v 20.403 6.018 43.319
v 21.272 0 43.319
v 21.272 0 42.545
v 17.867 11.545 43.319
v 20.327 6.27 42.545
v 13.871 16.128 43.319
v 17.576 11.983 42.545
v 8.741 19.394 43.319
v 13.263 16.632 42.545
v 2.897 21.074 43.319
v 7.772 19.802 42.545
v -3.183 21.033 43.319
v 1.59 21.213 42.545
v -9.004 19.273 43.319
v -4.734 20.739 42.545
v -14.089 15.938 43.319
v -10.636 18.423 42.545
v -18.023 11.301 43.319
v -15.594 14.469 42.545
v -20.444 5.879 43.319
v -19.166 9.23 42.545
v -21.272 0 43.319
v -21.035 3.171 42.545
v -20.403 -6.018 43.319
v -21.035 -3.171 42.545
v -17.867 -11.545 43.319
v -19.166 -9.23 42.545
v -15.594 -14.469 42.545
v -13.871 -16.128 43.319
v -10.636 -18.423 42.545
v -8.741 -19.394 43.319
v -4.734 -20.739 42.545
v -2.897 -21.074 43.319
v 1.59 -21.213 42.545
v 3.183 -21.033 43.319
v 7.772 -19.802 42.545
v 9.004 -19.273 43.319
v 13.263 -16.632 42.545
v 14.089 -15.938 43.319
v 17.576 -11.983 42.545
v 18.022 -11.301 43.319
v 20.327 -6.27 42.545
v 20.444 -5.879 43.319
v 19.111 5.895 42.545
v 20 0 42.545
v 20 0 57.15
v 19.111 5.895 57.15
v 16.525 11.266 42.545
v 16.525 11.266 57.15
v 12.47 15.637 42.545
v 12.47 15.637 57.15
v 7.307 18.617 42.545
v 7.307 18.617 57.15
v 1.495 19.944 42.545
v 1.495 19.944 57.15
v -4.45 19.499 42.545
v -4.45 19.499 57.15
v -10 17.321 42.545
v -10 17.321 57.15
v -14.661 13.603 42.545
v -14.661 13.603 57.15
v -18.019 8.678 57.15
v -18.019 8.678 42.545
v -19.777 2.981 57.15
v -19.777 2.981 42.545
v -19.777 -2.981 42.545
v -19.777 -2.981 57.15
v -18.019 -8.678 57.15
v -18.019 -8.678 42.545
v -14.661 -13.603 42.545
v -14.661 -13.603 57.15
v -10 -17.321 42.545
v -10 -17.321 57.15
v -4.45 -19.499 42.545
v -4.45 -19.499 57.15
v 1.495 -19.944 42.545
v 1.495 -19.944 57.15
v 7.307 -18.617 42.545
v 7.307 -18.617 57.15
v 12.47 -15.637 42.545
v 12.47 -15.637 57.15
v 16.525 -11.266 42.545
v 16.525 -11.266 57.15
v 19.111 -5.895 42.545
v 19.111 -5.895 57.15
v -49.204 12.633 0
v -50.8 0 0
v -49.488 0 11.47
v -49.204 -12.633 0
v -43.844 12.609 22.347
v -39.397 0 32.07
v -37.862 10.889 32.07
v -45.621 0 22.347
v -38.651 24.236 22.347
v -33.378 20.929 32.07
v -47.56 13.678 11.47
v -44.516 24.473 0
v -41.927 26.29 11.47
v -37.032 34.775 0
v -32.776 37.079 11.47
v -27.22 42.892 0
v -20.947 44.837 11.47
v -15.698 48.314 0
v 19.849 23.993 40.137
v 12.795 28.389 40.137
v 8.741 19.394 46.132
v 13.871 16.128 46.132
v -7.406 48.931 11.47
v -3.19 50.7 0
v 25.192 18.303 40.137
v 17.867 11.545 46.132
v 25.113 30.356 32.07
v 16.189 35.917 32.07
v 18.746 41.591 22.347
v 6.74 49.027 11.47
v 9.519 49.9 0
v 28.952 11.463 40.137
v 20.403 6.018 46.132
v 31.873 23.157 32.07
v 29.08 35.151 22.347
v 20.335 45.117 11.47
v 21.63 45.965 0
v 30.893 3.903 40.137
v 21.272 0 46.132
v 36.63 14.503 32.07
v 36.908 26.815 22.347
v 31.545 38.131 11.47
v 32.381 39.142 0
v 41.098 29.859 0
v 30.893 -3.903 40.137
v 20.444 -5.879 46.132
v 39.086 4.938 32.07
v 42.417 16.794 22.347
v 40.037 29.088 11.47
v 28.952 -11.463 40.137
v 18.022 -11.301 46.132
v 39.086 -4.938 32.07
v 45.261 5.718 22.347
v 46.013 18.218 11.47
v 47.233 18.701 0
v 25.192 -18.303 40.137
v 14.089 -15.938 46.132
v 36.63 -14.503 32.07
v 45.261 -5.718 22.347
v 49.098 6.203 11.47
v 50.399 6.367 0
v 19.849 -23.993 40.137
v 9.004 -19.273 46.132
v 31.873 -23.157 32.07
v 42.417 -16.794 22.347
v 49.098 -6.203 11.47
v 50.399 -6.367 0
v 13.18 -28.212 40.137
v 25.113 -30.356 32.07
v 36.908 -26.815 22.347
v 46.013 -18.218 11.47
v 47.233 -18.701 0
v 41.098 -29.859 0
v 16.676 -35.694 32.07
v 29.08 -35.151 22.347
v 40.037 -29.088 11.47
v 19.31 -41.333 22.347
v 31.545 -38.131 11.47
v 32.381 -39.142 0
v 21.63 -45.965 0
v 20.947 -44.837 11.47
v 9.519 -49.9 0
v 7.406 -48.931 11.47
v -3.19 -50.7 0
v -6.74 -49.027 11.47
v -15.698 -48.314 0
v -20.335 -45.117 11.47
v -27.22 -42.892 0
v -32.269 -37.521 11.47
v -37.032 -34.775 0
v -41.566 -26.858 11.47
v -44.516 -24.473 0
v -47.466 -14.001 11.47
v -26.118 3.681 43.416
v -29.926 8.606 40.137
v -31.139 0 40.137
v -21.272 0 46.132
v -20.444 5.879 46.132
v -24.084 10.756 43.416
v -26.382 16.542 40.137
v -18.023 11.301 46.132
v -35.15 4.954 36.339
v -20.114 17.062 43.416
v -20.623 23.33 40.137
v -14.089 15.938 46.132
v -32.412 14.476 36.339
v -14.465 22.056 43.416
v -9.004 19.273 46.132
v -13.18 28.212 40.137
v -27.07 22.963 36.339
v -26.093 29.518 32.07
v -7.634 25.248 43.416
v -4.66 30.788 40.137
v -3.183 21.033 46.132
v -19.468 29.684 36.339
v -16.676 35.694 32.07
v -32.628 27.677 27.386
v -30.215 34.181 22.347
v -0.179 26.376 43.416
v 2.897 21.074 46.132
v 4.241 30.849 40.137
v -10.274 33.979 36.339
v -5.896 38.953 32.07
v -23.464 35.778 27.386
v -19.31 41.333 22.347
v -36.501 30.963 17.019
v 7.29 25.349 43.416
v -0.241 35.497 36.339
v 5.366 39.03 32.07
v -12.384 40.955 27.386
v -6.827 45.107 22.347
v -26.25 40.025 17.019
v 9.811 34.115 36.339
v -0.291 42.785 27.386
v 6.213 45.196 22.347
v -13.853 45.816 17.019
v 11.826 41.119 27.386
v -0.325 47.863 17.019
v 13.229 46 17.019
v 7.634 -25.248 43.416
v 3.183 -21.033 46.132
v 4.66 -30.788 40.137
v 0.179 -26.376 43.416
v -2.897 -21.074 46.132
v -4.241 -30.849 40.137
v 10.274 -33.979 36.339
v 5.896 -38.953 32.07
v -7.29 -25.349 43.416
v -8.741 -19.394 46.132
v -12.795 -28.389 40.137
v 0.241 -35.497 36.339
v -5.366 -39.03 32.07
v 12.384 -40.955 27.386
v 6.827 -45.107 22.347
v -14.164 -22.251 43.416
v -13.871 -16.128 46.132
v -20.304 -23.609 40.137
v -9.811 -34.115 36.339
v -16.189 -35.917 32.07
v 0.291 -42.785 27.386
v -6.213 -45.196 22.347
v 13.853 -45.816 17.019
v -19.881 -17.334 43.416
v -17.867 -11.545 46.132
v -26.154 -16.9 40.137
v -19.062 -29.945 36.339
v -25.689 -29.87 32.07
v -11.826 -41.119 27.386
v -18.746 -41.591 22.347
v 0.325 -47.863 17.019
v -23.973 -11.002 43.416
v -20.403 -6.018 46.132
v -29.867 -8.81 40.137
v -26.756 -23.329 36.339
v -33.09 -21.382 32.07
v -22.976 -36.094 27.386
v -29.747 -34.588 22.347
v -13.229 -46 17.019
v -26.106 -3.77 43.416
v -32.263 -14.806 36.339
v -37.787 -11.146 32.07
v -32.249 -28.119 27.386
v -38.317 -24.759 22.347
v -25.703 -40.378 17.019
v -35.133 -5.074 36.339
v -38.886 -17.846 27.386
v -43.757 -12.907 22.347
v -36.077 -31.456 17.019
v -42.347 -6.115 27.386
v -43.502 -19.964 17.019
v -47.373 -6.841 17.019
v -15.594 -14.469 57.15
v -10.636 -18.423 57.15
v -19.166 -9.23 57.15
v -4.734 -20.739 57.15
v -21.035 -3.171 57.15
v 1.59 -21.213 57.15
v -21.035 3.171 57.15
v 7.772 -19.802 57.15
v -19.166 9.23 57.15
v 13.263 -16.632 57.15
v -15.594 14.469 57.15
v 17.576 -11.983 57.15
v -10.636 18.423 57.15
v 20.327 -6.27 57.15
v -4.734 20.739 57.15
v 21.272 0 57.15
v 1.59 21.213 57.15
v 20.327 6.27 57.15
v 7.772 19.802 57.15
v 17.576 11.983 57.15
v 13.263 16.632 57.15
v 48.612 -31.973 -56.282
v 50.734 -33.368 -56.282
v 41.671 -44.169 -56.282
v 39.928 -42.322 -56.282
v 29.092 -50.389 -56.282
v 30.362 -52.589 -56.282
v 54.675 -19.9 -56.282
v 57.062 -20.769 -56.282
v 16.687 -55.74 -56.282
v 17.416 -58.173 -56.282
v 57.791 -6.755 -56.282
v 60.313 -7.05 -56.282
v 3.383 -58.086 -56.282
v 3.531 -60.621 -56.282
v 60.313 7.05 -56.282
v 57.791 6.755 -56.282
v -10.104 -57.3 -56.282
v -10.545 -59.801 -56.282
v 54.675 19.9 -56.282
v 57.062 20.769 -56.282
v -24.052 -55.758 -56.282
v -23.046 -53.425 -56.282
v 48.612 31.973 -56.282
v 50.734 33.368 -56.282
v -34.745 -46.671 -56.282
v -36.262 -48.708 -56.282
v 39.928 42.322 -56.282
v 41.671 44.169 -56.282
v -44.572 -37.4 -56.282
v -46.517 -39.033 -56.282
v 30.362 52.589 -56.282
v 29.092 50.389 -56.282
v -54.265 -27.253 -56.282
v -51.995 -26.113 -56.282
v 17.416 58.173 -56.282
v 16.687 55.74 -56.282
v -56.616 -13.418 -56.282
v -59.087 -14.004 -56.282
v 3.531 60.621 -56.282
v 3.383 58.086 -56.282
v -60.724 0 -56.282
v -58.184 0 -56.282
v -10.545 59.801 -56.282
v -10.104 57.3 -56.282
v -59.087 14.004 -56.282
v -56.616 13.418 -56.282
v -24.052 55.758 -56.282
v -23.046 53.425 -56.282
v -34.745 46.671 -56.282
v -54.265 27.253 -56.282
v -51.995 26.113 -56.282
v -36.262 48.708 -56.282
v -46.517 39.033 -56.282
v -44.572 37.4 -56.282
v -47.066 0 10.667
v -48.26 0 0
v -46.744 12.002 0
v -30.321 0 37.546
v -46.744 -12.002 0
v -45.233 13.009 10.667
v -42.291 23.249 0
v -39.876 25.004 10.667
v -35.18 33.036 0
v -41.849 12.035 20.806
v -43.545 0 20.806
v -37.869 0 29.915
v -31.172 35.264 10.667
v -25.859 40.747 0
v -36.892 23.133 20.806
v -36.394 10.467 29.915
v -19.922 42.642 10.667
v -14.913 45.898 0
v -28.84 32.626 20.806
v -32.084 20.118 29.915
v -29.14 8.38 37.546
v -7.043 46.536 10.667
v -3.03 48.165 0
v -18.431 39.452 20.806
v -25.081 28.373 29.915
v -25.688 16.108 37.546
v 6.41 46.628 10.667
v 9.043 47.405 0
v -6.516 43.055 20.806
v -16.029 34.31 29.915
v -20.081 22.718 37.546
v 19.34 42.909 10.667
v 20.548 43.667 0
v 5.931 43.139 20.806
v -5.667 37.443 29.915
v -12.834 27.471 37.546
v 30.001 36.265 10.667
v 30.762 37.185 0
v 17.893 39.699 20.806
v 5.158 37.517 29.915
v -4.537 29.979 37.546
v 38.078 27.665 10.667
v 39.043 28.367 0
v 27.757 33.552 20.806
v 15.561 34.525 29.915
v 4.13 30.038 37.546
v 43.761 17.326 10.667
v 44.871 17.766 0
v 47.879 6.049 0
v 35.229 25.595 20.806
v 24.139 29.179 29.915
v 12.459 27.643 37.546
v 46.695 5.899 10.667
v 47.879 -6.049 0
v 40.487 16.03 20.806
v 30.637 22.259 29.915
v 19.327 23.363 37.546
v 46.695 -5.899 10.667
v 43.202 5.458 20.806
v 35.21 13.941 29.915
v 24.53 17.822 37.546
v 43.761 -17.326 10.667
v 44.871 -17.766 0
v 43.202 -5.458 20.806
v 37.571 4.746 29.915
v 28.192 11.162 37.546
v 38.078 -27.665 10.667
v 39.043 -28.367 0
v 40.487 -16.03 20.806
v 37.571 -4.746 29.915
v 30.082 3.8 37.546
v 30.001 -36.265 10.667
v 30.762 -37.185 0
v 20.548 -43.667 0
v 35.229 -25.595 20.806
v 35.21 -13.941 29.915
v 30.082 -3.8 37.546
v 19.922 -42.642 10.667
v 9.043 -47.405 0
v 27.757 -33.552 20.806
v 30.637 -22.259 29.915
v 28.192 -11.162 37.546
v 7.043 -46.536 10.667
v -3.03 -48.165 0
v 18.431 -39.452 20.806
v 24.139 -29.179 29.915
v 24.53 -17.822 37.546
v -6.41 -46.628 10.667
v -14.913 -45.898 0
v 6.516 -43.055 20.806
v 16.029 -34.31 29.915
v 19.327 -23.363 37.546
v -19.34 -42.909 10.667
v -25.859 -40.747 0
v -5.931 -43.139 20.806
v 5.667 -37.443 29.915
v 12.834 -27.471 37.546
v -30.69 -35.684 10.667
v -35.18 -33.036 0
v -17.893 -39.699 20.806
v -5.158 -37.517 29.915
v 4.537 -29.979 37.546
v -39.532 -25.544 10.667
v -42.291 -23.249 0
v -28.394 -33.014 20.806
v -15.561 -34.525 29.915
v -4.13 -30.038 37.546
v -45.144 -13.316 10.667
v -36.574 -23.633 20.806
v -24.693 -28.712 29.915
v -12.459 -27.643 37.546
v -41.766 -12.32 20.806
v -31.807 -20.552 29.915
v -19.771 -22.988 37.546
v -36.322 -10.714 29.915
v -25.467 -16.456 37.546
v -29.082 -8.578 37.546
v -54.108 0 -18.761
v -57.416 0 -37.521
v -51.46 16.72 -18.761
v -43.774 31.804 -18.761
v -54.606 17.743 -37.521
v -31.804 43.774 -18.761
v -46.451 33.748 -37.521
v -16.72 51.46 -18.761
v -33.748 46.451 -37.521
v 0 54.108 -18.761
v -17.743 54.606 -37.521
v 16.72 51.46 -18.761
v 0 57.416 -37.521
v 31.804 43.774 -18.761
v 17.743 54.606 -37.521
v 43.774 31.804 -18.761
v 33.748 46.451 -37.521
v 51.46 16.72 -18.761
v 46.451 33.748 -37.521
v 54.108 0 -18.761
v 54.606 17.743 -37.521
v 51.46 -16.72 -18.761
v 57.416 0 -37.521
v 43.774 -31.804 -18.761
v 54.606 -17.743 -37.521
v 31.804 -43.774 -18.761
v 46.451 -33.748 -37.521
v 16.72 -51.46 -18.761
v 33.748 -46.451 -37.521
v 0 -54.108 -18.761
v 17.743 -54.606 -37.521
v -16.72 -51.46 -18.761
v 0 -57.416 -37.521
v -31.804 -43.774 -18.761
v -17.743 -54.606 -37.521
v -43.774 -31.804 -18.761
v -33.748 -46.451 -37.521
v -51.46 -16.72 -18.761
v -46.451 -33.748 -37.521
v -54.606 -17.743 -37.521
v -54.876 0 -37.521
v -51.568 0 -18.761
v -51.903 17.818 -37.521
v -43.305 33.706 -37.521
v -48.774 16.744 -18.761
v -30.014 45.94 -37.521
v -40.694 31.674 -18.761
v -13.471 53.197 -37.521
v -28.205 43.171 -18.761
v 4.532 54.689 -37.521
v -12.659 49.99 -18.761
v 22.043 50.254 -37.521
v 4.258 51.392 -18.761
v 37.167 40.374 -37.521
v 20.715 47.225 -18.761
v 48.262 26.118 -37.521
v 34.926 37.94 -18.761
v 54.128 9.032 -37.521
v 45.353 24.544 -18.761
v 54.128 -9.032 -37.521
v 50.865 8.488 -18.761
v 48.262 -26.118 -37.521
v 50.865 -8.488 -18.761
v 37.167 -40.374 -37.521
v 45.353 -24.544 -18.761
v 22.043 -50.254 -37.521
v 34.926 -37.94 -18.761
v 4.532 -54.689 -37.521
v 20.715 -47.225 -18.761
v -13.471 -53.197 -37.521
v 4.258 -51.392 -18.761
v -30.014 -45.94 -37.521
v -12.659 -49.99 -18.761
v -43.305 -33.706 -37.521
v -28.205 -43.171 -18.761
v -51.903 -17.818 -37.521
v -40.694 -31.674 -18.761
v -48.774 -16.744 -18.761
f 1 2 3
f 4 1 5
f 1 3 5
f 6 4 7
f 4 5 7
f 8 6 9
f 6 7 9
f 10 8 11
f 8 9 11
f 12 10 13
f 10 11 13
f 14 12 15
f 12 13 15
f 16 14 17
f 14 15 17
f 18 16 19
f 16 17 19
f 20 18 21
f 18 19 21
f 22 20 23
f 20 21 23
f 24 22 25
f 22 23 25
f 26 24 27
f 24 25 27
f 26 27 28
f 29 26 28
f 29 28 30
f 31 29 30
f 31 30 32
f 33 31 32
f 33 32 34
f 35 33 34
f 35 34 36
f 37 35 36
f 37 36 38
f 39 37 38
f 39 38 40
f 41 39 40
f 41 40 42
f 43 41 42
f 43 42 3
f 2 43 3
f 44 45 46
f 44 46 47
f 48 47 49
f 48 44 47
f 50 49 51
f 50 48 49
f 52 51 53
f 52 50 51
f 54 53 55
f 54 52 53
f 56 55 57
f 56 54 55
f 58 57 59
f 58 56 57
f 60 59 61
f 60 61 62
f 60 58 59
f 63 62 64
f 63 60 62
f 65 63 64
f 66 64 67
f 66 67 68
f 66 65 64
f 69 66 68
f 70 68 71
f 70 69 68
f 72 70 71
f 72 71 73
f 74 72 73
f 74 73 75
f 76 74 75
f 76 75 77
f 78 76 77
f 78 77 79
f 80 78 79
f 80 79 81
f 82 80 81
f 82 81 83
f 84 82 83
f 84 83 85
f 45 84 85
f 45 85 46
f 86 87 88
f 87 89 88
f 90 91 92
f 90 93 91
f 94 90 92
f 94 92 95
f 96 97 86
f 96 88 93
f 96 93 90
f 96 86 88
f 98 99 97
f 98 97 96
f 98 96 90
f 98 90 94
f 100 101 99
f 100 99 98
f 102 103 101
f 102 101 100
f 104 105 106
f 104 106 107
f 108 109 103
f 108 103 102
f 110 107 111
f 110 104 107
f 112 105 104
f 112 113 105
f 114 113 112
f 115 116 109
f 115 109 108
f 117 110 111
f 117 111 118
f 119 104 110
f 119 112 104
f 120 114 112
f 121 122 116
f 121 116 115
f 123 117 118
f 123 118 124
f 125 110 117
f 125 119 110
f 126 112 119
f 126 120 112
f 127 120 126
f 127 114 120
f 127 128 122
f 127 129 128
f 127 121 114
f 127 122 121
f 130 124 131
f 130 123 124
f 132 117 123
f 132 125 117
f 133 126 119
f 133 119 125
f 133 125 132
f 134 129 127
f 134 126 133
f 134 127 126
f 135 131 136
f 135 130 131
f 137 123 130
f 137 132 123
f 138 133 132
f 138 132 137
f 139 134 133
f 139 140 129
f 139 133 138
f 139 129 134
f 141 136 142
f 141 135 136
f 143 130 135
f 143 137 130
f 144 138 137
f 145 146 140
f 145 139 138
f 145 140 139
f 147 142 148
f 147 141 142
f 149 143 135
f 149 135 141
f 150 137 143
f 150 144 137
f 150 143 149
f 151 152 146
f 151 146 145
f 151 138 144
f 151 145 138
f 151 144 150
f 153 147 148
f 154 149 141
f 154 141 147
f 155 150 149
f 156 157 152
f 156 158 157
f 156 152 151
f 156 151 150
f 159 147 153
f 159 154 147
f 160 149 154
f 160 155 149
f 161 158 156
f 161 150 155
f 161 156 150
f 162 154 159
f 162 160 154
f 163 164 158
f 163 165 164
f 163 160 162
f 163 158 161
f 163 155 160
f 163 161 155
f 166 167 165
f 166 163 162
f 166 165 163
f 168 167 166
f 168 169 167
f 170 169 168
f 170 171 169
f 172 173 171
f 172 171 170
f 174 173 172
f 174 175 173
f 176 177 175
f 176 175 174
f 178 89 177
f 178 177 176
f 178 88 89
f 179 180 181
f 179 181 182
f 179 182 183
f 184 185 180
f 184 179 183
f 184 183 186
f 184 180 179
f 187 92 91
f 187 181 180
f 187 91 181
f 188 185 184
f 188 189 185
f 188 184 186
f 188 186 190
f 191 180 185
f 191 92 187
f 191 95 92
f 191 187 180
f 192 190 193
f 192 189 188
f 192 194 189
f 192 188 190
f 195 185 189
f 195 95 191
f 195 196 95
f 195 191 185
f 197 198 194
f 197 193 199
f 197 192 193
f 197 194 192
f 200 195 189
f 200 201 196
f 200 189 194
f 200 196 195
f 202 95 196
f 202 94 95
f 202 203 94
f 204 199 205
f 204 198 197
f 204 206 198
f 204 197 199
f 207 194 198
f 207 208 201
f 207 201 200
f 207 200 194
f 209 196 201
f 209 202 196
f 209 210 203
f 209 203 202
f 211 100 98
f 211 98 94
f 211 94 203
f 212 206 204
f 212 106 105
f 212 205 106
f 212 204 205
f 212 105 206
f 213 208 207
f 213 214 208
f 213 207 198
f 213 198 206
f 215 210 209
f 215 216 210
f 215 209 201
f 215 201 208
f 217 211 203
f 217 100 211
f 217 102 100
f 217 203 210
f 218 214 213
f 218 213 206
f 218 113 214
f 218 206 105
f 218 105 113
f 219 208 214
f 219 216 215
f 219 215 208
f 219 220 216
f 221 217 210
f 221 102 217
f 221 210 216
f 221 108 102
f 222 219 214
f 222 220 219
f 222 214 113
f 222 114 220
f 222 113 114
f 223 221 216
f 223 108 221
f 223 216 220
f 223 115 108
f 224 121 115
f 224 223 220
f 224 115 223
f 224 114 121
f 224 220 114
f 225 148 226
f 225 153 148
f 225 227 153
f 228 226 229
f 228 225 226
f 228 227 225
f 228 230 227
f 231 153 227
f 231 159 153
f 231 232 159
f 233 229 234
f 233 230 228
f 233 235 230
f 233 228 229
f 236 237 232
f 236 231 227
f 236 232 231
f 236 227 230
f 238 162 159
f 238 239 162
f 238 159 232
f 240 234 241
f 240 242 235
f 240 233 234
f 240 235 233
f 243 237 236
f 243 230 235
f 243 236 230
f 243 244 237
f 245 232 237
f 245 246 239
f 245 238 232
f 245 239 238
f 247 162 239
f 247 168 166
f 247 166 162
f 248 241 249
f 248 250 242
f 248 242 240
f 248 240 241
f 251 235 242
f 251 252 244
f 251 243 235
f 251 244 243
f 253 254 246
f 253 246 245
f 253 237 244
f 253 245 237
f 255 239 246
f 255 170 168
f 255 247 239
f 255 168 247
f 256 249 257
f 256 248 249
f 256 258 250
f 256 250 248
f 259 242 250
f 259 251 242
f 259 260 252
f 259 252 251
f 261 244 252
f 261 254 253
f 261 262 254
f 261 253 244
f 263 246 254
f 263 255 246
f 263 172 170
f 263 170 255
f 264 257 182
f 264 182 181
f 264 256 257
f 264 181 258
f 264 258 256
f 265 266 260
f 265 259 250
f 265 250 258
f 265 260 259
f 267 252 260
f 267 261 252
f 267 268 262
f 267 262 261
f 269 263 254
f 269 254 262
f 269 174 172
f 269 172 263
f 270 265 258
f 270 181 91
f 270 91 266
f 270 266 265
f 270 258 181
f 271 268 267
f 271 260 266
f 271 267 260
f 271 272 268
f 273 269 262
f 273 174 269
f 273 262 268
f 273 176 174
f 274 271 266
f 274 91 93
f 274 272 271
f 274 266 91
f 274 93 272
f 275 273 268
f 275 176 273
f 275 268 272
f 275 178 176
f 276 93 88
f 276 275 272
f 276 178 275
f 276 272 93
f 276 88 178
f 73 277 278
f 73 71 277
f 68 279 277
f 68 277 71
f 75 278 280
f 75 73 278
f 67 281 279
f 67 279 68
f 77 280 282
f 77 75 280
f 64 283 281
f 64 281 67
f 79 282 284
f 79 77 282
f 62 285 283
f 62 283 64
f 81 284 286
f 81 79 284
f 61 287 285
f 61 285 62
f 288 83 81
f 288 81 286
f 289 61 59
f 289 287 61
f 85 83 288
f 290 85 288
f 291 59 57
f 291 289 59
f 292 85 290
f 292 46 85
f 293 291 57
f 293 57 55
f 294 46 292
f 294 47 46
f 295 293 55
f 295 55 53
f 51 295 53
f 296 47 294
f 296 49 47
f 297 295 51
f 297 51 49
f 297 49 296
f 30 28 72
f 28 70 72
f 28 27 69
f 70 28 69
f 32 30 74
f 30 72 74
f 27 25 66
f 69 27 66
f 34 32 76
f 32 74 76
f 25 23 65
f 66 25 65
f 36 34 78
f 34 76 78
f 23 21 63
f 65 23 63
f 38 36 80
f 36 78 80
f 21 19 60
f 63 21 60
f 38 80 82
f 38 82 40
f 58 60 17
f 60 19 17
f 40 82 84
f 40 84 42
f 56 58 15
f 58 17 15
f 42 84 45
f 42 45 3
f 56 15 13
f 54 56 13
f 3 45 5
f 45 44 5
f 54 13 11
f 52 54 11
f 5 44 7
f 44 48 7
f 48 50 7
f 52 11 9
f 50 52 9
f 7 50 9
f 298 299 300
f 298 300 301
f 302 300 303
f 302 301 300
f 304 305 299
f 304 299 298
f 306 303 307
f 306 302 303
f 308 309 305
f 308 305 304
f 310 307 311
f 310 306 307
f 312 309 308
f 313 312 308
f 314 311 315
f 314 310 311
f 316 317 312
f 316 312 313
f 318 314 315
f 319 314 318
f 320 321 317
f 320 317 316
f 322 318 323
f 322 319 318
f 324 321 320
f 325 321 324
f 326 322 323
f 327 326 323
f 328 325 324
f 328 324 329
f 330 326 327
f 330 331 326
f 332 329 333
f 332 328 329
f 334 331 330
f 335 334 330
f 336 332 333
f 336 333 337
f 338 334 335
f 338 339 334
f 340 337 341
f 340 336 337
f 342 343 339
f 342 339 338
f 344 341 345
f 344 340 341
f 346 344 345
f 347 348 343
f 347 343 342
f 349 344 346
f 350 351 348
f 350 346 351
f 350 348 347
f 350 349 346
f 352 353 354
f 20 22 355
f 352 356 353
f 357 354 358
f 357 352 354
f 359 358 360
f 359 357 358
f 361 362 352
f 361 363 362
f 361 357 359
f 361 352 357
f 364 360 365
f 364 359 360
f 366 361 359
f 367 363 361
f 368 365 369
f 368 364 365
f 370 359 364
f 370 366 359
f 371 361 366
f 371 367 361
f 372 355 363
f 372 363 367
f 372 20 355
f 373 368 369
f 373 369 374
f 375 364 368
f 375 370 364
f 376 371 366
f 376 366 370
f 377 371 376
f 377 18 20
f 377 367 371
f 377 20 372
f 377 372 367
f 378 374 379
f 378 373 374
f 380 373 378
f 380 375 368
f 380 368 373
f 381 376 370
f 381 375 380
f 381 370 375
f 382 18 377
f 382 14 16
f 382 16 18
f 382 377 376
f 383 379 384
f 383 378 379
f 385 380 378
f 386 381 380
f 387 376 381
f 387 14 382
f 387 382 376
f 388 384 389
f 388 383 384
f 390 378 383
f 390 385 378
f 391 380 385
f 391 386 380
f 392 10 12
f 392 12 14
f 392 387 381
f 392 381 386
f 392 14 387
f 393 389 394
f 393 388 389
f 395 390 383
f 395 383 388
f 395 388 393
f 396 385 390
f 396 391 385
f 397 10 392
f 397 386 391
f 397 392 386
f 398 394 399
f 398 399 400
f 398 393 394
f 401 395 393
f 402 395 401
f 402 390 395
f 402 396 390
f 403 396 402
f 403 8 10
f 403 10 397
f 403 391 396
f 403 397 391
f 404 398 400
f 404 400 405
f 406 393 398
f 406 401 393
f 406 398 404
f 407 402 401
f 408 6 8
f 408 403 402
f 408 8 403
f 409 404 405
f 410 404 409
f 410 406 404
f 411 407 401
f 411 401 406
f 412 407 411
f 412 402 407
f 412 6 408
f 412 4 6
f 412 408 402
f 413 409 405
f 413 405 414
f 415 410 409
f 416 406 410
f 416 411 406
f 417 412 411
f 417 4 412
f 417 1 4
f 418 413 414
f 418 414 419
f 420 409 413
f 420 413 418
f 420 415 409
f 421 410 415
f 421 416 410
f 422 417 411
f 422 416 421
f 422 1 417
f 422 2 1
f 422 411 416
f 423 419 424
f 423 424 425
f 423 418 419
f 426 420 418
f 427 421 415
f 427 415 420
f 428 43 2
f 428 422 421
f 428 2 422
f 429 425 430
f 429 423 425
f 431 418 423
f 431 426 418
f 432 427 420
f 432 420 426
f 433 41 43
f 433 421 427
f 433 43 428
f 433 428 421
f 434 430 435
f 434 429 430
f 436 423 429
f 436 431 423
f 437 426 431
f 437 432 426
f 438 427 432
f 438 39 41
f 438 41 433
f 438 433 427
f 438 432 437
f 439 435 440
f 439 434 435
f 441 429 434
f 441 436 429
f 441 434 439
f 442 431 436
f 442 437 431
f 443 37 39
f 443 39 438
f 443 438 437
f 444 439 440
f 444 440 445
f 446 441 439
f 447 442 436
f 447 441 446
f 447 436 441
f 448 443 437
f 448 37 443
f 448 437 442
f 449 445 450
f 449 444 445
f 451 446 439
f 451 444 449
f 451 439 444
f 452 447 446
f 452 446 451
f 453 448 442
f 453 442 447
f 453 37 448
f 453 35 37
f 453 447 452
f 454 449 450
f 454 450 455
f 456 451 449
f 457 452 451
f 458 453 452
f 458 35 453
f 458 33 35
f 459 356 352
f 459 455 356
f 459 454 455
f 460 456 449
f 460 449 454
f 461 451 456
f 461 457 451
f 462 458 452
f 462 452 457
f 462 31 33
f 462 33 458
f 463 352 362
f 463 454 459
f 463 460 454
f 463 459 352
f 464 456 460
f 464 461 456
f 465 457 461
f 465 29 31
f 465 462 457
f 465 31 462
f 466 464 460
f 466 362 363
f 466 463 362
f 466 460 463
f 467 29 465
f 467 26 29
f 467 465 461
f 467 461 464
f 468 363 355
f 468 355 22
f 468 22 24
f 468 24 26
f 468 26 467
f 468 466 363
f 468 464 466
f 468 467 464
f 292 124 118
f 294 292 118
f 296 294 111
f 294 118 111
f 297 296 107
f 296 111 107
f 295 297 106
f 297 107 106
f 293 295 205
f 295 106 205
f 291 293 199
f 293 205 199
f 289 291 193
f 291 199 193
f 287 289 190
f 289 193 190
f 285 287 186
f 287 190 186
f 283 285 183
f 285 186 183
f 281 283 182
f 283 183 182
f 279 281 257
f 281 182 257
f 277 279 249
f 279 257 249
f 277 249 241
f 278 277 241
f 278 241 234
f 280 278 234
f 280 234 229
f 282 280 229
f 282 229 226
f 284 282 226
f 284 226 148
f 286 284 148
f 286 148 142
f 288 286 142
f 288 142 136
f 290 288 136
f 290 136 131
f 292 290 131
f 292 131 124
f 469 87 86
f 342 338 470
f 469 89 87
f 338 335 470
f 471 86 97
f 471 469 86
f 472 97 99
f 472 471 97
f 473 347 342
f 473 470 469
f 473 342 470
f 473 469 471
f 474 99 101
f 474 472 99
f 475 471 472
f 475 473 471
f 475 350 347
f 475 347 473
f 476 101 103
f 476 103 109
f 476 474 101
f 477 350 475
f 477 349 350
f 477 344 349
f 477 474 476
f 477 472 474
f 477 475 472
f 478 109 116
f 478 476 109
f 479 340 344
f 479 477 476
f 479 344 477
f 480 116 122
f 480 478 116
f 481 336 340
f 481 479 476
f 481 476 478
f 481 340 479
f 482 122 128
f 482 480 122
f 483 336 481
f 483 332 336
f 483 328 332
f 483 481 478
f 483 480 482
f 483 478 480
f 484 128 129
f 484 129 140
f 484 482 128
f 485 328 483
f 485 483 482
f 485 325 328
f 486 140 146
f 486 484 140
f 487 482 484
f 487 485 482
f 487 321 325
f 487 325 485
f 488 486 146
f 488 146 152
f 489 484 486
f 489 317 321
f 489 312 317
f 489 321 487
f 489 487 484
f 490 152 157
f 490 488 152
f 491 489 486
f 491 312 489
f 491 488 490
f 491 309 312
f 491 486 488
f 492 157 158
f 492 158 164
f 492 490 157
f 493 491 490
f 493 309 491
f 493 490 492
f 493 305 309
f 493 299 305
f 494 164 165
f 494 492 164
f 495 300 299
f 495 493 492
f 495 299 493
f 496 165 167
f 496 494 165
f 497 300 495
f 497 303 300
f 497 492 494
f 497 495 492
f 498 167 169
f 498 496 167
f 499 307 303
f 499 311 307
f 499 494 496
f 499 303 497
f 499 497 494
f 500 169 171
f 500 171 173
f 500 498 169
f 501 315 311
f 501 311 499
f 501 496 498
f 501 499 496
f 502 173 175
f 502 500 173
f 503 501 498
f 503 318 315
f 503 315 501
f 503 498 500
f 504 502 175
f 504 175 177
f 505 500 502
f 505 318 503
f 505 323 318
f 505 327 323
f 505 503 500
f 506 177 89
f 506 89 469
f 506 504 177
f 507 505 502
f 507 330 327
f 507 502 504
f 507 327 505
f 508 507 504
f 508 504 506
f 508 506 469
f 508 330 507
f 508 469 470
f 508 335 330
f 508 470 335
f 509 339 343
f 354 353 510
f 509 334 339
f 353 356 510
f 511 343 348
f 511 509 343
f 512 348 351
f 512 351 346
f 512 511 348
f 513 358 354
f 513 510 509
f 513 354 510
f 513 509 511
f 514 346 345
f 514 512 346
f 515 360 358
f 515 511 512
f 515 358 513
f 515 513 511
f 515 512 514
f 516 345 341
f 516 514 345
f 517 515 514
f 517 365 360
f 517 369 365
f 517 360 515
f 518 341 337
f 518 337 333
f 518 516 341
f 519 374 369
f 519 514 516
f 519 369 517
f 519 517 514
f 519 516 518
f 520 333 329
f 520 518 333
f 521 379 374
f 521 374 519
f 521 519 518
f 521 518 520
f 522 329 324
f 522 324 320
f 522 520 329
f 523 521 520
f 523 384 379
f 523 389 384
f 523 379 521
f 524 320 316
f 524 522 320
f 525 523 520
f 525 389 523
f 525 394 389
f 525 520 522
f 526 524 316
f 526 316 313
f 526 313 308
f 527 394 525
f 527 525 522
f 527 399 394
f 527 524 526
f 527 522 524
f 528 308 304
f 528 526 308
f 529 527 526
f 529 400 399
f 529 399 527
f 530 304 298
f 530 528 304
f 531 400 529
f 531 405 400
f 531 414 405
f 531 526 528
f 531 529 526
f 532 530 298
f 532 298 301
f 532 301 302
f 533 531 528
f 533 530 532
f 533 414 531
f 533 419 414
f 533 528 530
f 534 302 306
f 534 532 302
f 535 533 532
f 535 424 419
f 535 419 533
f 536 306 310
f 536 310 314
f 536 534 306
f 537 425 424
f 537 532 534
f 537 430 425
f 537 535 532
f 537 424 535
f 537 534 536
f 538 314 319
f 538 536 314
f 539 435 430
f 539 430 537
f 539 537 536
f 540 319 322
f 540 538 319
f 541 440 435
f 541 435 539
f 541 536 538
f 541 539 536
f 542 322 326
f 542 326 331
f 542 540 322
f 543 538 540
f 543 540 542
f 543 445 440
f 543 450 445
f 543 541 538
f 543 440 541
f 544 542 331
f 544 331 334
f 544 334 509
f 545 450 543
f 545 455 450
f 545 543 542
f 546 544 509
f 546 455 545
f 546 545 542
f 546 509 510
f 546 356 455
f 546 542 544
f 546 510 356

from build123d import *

# Parameters (mm, degrees)
F2_R     = 21.2725
F2_R_2   = 20
F3_DEPTH = 57.15
F4_DEPTH = 57.151
F5_DEPTH = 42.545


with BuildPart() as f1:
    # F0 (on Front) → F1 (revolve)
    with BuildSketch(Plane.XZ):
        with BuildLine():
            Line((0, 48.26), (0, 50.8))
            ThreePointArc((0, 50.8), (-35.921024, 35.921024), (-50.8, 0))
            Line((-50.8, 0), (-48.26, 0))
            ThreePointArc((-48.26, 0), (-34.124973, 34.124973), (0, 48.26))
        make_face()
        Polygon((-48.26, 0), (-50.8, 0), (-60.723993, -56.281763), (-58.183993, -56.281763), align=None)
    revolve(axis=Axis((0, 0, -2.740882), (0, 0, -1)))

    # F2 (on Top) → F3 (join)
    with BuildSketch(Plane.XY):
        Circle(F2_R)
        Circle(F2_R_2, mode=Mode.SUBTRACT)
    extrude(amount=F3_DEPTH)

    # F2 (on Top) → F4 (cut, through all)
    with BuildSketch(Plane.XY):
        Circle(F2_R_2)
    extrude(amount=F4_DEPTH, mode=Mode.SUBTRACT)

    # F2 (on Top) → F5 (cut)
    with BuildSketch(Plane.XY):
        Circle(F2_R_2)
        Circle(F2_R)
        Circle(F2_R_2, mode=Mode.SUBTRACT)
    extrude(amount=F5_DEPTH, mode=Mode.SUBTRACT)


solid = f1.part
